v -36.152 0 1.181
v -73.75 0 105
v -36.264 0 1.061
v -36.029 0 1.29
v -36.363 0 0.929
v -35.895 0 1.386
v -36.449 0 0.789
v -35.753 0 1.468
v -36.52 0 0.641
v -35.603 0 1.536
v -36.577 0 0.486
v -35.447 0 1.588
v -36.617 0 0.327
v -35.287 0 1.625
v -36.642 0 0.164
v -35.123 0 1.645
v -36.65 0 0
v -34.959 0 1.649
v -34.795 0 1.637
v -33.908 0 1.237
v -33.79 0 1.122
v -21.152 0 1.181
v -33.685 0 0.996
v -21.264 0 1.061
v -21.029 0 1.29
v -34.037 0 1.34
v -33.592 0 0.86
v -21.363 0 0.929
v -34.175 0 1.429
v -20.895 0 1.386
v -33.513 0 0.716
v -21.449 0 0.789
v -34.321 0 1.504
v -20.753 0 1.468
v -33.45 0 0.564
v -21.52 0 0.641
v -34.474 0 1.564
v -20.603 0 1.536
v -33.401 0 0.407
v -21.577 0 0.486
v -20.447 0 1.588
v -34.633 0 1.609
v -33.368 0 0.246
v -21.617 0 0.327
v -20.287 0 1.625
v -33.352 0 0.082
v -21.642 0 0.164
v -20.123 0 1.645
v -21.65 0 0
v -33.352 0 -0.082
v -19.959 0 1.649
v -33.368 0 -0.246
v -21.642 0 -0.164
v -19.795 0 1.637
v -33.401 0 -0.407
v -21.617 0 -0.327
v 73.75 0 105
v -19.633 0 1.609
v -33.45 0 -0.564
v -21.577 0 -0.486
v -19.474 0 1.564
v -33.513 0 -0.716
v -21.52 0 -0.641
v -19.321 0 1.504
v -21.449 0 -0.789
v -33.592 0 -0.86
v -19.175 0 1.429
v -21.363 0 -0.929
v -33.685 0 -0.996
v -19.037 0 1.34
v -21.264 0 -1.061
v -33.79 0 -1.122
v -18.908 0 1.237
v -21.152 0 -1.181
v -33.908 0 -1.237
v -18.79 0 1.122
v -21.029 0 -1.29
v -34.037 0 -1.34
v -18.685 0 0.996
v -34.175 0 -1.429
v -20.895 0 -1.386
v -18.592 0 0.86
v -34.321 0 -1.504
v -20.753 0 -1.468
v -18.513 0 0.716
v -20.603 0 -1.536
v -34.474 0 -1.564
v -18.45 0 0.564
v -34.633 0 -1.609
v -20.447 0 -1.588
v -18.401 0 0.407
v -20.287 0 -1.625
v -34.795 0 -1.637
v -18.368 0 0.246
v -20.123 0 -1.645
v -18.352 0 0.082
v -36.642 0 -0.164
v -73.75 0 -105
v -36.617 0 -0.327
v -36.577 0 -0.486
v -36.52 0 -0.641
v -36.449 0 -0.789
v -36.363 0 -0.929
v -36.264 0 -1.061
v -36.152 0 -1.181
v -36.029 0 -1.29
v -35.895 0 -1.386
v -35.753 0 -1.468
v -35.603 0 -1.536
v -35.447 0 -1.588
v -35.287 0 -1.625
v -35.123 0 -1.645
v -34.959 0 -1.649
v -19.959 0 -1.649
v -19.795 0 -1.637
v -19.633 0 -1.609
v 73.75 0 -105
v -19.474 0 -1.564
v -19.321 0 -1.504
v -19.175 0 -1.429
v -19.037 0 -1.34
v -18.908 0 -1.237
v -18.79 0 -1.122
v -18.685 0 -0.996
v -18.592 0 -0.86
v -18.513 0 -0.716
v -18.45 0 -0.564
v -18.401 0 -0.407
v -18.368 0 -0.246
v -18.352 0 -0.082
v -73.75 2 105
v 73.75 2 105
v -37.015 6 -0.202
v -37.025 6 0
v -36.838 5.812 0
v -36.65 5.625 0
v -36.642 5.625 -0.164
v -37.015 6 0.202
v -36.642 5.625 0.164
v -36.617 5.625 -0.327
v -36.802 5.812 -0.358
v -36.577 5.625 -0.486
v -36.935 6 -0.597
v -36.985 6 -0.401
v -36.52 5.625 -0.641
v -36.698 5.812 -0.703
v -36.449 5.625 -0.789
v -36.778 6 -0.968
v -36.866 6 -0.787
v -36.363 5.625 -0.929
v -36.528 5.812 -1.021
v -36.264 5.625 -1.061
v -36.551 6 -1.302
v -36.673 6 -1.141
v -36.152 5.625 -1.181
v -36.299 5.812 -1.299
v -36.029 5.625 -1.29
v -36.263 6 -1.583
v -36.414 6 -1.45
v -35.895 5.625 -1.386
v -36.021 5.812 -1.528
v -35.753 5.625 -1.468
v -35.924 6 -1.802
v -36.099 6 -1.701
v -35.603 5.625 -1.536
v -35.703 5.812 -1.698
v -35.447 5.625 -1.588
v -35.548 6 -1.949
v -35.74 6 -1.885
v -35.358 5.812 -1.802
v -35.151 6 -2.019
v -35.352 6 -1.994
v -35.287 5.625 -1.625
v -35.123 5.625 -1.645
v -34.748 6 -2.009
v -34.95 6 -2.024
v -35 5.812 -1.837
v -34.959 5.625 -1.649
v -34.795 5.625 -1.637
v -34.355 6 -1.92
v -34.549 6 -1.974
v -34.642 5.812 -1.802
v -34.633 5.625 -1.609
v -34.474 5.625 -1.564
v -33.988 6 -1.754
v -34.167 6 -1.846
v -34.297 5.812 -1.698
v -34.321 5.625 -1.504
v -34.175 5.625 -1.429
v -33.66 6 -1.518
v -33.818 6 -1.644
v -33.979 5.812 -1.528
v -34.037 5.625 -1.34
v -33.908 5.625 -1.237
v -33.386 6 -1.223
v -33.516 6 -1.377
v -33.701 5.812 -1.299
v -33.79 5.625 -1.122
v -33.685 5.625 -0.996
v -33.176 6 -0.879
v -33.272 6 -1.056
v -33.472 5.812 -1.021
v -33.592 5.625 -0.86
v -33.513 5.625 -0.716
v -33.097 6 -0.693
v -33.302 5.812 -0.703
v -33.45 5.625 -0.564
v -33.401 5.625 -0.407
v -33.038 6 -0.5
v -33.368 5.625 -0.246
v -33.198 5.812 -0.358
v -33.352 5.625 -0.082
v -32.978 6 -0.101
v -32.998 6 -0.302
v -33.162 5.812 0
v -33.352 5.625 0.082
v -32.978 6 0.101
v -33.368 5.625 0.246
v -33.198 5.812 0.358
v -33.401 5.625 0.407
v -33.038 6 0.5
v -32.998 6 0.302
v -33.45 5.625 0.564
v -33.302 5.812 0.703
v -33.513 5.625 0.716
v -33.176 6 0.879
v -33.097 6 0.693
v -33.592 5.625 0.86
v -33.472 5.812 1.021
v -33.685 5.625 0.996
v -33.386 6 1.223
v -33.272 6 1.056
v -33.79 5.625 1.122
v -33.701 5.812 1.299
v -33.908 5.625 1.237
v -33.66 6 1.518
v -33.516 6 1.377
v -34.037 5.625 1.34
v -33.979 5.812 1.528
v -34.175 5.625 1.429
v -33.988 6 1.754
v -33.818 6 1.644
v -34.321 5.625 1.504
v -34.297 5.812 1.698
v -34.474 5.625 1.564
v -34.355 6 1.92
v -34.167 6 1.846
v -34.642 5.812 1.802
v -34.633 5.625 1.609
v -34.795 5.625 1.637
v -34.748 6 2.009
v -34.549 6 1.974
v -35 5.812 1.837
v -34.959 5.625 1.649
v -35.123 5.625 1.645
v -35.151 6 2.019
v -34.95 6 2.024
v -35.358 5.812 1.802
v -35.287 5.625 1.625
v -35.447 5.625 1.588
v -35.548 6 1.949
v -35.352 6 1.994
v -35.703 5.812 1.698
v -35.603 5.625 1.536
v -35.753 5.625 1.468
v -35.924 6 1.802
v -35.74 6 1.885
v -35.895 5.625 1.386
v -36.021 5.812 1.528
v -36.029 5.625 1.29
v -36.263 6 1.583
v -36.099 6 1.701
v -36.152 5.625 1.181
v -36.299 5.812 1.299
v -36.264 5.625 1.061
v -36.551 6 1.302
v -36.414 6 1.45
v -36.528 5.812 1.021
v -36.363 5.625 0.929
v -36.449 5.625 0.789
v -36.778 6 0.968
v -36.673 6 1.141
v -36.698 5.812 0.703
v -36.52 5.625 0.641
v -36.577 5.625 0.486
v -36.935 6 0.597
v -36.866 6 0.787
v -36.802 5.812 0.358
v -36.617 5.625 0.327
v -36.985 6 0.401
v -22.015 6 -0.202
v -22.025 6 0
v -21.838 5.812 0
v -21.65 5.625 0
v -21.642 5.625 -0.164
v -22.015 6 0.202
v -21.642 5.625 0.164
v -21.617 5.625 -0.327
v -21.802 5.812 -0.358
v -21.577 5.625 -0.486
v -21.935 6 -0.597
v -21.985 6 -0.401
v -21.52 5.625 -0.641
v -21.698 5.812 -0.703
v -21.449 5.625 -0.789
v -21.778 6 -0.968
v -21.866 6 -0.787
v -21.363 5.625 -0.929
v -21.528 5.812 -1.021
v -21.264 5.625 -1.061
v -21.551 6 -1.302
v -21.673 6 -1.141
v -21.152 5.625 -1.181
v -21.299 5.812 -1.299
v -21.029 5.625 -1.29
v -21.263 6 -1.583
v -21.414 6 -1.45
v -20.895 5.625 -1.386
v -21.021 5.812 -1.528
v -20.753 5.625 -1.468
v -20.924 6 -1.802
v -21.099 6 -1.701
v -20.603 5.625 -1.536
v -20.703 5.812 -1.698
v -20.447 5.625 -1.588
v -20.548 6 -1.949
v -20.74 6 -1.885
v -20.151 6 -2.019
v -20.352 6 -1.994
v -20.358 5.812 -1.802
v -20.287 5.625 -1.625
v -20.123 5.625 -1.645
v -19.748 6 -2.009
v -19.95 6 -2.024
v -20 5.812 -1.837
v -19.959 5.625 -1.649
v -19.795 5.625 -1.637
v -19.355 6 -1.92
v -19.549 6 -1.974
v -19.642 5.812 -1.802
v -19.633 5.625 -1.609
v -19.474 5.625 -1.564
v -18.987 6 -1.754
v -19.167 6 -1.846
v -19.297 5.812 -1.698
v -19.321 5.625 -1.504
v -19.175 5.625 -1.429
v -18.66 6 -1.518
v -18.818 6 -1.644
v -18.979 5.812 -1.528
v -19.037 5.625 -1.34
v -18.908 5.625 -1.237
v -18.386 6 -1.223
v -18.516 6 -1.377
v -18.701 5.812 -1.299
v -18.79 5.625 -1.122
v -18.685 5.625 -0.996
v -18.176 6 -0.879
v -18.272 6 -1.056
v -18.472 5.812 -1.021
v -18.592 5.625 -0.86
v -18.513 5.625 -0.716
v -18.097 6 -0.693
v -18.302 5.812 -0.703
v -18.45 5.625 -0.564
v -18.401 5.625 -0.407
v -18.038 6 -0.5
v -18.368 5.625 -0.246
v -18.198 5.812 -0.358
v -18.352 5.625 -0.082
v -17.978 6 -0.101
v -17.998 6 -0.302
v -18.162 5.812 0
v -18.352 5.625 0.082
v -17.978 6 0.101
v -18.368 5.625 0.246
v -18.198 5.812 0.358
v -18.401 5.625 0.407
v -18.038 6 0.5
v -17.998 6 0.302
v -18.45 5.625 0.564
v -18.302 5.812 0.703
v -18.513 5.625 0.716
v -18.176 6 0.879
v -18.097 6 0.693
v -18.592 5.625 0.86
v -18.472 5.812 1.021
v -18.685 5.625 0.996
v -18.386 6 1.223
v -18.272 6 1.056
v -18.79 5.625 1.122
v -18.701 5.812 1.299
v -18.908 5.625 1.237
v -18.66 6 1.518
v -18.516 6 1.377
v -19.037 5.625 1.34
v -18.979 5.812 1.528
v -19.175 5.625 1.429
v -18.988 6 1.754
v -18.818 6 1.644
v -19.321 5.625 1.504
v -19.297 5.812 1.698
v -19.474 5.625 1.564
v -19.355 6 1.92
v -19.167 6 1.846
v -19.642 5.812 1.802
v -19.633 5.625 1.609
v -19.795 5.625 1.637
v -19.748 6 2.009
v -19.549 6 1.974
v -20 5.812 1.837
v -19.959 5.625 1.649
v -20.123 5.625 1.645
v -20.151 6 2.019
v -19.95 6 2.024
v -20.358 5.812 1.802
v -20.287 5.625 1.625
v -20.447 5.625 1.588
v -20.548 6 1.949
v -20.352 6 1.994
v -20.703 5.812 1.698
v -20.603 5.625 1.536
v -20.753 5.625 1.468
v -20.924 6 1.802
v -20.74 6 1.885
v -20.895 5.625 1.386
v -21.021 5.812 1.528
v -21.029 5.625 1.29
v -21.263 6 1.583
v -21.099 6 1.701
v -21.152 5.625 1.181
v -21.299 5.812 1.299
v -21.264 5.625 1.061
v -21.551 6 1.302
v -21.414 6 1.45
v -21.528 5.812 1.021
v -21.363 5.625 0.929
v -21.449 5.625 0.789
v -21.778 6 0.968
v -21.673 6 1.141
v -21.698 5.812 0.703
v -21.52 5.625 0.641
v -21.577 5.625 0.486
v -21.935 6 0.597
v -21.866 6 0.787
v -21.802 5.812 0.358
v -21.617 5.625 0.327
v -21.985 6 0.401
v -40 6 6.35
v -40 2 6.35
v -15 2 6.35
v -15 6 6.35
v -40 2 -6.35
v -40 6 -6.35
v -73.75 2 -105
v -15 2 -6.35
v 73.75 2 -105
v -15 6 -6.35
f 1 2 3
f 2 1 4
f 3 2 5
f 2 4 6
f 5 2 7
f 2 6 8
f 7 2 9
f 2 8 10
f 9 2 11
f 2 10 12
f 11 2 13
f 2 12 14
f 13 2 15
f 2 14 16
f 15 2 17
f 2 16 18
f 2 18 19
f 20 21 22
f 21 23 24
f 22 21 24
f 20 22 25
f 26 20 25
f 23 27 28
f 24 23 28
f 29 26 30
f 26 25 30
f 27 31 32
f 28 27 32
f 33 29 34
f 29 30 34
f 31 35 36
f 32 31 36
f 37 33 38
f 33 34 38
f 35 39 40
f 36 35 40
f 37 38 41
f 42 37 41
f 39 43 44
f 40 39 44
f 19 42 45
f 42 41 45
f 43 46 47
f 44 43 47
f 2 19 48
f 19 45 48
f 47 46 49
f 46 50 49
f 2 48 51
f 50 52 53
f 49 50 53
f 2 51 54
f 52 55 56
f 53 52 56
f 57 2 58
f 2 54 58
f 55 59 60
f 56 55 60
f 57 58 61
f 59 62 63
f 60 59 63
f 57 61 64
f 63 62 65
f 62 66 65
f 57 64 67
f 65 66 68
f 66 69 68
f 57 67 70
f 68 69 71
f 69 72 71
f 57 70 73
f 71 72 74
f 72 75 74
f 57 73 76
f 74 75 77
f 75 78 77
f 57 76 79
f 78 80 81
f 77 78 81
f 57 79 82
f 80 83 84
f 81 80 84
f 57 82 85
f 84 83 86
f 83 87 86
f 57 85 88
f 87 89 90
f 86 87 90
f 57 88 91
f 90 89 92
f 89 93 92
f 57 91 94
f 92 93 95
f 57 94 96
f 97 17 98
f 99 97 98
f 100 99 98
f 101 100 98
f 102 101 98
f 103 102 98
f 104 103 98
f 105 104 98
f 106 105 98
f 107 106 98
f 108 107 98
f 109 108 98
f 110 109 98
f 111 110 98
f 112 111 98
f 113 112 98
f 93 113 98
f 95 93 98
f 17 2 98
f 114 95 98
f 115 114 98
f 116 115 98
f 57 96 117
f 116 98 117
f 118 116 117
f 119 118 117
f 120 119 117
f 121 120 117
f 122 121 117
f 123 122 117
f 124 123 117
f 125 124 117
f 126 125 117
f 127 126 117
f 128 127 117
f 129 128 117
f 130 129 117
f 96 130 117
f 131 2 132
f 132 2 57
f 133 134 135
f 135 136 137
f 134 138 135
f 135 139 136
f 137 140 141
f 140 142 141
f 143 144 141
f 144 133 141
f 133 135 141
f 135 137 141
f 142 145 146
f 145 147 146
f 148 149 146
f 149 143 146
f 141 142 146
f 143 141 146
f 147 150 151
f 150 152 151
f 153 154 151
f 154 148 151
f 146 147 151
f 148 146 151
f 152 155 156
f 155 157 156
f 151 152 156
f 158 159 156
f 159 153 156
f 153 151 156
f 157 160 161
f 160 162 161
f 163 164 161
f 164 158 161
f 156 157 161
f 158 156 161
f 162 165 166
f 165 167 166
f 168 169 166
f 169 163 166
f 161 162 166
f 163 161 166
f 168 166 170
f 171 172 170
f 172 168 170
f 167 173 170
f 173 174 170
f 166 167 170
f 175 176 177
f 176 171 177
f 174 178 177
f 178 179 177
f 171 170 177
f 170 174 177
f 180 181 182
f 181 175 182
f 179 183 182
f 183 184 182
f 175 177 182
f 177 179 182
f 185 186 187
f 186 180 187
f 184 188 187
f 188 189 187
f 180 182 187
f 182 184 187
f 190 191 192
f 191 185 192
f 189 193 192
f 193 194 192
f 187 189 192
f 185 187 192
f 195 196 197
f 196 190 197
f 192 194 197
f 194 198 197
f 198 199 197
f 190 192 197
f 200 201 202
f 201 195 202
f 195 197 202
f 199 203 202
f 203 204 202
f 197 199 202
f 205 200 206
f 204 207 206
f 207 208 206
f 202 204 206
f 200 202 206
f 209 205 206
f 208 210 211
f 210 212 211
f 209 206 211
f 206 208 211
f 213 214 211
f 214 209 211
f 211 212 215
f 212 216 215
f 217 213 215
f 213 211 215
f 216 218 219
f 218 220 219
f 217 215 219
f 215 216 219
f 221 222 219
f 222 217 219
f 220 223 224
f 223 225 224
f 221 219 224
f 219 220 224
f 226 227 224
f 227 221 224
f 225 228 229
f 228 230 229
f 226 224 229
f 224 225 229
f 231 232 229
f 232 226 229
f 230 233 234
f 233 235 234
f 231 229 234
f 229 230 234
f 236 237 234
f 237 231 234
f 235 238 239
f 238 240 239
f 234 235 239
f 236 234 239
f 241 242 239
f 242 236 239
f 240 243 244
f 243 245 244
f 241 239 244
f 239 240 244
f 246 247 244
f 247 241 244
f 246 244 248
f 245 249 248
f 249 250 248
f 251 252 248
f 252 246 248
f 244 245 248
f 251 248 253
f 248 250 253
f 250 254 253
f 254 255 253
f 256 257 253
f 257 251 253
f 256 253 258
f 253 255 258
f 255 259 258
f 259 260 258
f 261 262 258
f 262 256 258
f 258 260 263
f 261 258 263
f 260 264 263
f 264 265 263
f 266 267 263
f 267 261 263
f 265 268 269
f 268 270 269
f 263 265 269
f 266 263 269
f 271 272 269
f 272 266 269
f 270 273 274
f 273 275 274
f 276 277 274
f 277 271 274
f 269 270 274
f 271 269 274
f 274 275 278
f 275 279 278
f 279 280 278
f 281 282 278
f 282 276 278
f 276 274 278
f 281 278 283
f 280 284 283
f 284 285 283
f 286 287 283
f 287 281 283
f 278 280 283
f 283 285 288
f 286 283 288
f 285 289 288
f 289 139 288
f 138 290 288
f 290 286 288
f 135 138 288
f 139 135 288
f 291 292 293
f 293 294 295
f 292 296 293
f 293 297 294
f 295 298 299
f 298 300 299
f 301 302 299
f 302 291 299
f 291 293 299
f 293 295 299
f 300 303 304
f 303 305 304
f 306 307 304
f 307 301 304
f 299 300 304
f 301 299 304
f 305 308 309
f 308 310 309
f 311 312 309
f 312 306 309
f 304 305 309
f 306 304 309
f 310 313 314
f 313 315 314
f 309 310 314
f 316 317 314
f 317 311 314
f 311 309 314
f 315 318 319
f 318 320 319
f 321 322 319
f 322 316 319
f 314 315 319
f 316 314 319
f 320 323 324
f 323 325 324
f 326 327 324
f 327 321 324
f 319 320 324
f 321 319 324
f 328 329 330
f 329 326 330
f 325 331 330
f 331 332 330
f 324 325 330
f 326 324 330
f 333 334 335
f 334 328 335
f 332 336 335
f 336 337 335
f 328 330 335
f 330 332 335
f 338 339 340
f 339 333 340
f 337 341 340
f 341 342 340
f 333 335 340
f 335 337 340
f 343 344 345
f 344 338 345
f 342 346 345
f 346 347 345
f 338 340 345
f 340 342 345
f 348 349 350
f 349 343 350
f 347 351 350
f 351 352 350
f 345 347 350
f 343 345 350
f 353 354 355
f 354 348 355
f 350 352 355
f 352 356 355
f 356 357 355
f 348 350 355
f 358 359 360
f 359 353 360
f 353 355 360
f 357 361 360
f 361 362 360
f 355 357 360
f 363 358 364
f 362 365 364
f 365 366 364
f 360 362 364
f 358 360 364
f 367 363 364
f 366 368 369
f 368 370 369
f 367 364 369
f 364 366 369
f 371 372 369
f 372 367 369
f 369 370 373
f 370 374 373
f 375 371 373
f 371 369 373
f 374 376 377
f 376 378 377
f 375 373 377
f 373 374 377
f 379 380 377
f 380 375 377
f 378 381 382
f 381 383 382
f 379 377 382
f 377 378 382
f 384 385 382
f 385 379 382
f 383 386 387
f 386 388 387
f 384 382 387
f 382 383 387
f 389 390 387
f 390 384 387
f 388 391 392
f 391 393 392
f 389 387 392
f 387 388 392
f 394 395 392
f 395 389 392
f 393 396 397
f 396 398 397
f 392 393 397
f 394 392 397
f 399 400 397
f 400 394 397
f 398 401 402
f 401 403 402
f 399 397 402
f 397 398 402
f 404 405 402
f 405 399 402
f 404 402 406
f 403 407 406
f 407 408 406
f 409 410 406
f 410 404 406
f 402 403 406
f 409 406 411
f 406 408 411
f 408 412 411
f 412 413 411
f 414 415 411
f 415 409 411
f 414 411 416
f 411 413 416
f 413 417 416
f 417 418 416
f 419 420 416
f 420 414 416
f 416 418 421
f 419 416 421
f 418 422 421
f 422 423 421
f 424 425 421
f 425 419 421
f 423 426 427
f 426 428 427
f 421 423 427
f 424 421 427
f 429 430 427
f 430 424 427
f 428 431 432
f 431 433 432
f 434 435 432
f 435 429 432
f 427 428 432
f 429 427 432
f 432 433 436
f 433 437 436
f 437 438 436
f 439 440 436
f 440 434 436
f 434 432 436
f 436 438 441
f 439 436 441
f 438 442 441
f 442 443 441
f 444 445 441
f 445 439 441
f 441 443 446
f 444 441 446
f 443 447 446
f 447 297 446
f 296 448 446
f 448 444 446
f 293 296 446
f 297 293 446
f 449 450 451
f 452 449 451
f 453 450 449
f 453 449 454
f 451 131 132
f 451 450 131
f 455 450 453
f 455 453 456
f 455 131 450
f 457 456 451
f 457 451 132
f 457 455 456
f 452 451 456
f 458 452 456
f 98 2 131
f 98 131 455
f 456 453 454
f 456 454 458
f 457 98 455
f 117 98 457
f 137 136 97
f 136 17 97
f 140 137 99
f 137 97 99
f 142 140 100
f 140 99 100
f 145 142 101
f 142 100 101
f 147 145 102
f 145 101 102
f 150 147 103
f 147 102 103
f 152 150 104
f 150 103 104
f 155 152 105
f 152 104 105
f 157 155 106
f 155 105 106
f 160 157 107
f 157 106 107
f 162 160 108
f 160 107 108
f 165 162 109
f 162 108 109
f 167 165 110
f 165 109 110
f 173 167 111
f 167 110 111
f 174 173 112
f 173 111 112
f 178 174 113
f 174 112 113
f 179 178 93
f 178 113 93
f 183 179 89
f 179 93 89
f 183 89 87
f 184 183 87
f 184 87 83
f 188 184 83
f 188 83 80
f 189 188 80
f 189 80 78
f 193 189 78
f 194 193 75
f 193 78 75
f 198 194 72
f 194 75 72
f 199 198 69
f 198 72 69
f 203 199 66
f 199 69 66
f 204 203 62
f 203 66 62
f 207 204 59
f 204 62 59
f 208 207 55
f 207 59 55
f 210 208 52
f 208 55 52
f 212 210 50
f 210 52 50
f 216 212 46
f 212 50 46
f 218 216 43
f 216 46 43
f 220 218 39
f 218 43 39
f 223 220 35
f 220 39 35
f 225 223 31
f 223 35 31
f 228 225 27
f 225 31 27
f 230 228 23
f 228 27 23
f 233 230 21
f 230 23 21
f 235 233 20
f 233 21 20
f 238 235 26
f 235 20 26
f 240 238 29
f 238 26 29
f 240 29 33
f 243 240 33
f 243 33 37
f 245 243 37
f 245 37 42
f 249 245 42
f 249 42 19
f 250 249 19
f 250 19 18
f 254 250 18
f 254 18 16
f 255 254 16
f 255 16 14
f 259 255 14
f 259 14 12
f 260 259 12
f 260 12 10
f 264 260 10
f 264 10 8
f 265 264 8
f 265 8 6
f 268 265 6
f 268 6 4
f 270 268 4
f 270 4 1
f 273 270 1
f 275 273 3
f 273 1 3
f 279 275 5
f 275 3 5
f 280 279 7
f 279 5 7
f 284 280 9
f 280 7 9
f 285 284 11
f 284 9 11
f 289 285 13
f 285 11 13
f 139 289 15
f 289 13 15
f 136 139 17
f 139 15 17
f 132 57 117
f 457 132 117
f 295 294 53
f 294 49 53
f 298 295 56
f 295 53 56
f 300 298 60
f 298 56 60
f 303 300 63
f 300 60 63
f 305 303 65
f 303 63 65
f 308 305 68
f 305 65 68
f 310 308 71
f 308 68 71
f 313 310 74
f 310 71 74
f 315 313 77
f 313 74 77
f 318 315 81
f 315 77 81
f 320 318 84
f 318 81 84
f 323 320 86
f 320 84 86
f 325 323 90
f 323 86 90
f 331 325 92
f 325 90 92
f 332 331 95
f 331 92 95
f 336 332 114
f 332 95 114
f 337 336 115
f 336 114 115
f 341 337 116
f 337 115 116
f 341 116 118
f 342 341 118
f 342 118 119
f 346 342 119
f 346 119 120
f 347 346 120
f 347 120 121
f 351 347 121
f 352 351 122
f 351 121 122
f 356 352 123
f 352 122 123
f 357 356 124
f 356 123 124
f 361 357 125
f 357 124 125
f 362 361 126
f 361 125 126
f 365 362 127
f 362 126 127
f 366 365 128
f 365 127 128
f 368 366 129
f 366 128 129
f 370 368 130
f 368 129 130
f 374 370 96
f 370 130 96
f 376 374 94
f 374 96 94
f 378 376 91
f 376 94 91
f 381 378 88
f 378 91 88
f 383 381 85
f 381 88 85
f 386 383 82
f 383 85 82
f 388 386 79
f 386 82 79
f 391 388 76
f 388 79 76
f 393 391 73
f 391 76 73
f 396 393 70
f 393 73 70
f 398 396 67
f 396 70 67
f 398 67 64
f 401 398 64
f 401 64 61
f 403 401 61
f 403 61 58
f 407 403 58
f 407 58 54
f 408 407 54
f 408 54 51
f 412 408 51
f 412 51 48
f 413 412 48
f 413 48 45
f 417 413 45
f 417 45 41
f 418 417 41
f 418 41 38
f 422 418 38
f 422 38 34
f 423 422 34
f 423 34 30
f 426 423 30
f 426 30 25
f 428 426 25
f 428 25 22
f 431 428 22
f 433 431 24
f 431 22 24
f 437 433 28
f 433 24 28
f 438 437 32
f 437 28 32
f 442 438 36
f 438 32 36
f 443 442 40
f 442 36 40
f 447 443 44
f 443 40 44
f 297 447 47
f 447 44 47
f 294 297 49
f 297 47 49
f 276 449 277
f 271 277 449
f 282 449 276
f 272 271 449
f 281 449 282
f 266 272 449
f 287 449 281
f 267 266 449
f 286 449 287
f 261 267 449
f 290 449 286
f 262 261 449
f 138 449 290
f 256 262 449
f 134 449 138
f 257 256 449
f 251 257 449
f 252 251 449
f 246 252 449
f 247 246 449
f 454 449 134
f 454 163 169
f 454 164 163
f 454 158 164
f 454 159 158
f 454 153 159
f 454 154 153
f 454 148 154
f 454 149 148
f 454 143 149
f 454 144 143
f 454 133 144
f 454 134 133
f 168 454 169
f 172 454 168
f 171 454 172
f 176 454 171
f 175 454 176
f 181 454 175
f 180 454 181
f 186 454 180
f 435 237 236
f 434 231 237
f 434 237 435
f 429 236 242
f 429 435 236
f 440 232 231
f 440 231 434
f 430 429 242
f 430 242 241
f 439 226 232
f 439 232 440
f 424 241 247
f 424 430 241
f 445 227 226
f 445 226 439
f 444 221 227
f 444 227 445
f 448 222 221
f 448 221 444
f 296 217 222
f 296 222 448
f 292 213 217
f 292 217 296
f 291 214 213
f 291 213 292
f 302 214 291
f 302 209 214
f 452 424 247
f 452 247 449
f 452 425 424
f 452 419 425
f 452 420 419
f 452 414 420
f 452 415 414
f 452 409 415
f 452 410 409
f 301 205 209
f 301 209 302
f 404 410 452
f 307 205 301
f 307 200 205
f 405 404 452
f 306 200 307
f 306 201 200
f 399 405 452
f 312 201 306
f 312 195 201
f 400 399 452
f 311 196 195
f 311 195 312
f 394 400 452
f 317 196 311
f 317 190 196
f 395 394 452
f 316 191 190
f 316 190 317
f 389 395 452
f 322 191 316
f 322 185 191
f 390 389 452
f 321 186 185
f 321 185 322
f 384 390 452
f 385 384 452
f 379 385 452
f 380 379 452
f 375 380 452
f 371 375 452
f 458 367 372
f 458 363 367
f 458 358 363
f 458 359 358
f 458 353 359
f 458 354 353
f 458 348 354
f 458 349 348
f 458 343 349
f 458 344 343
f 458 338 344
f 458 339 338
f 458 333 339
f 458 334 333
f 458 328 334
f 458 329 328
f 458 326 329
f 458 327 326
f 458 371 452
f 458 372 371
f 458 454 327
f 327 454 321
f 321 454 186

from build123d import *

# Parameters (mm, degrees)
SKETCH1_W                   = 147.5
SKETCH1_H                   = 210
BOSS_EXTRUDE1_DEPTH         = 2
SKETCH3_W                   = 25
SKETCH3_H                   = 12.7
BOSS_EXTRUDE3_DEPTH         = 4
M4_TAPPED_HOLE1_D           = 3.3
M4_TAPPED_HOLE1_CSINK_D     = 4.05
M4_TAPPED_HOLE1_CSINK_ANGLE = 90


with BuildPart() as part:
    # Sketch1 → Boss-Extrude1 (new body)
    with BuildSketch(Plane(origin=(0, 0, 0), x_dir=(1, 0, 0), z_dir=(0, 1, 0))):
        Rectangle(SKETCH1_W, SKETCH1_H)
    extrude(amount=BOSS_EXTRUDE1_DEPTH)

    # Sketch3 → Boss-Extrude3 (add)
    with BuildSketch(Plane(origin=(0, 2, 0), x_dir=(1, 0, 0), z_dir=(0, 1, 0))):
        with Locations((-27.5, 0)):
            Rectangle(SKETCH3_W, SKETCH3_H)
    extrude(amount=BOSS_EXTRUDE3_DEPTH)

    # M4 Tapped Hole1 (through all)
    with Locations(Plane(origin=(0, 6, 0), x_dir=(1, 0, 0), z_dir=(0, 1, 0))):
        with Locations((-20, 0), (-35, 0)):
            CounterSinkHole(M4_TAPPED_HOLE1_D / 2, M4_TAPPED_HOLE1_CSINK_D / 2, counter_sink_angle=M4_TAPPED_HOLE1_CSINK_ANGLE)


solid = part.part
